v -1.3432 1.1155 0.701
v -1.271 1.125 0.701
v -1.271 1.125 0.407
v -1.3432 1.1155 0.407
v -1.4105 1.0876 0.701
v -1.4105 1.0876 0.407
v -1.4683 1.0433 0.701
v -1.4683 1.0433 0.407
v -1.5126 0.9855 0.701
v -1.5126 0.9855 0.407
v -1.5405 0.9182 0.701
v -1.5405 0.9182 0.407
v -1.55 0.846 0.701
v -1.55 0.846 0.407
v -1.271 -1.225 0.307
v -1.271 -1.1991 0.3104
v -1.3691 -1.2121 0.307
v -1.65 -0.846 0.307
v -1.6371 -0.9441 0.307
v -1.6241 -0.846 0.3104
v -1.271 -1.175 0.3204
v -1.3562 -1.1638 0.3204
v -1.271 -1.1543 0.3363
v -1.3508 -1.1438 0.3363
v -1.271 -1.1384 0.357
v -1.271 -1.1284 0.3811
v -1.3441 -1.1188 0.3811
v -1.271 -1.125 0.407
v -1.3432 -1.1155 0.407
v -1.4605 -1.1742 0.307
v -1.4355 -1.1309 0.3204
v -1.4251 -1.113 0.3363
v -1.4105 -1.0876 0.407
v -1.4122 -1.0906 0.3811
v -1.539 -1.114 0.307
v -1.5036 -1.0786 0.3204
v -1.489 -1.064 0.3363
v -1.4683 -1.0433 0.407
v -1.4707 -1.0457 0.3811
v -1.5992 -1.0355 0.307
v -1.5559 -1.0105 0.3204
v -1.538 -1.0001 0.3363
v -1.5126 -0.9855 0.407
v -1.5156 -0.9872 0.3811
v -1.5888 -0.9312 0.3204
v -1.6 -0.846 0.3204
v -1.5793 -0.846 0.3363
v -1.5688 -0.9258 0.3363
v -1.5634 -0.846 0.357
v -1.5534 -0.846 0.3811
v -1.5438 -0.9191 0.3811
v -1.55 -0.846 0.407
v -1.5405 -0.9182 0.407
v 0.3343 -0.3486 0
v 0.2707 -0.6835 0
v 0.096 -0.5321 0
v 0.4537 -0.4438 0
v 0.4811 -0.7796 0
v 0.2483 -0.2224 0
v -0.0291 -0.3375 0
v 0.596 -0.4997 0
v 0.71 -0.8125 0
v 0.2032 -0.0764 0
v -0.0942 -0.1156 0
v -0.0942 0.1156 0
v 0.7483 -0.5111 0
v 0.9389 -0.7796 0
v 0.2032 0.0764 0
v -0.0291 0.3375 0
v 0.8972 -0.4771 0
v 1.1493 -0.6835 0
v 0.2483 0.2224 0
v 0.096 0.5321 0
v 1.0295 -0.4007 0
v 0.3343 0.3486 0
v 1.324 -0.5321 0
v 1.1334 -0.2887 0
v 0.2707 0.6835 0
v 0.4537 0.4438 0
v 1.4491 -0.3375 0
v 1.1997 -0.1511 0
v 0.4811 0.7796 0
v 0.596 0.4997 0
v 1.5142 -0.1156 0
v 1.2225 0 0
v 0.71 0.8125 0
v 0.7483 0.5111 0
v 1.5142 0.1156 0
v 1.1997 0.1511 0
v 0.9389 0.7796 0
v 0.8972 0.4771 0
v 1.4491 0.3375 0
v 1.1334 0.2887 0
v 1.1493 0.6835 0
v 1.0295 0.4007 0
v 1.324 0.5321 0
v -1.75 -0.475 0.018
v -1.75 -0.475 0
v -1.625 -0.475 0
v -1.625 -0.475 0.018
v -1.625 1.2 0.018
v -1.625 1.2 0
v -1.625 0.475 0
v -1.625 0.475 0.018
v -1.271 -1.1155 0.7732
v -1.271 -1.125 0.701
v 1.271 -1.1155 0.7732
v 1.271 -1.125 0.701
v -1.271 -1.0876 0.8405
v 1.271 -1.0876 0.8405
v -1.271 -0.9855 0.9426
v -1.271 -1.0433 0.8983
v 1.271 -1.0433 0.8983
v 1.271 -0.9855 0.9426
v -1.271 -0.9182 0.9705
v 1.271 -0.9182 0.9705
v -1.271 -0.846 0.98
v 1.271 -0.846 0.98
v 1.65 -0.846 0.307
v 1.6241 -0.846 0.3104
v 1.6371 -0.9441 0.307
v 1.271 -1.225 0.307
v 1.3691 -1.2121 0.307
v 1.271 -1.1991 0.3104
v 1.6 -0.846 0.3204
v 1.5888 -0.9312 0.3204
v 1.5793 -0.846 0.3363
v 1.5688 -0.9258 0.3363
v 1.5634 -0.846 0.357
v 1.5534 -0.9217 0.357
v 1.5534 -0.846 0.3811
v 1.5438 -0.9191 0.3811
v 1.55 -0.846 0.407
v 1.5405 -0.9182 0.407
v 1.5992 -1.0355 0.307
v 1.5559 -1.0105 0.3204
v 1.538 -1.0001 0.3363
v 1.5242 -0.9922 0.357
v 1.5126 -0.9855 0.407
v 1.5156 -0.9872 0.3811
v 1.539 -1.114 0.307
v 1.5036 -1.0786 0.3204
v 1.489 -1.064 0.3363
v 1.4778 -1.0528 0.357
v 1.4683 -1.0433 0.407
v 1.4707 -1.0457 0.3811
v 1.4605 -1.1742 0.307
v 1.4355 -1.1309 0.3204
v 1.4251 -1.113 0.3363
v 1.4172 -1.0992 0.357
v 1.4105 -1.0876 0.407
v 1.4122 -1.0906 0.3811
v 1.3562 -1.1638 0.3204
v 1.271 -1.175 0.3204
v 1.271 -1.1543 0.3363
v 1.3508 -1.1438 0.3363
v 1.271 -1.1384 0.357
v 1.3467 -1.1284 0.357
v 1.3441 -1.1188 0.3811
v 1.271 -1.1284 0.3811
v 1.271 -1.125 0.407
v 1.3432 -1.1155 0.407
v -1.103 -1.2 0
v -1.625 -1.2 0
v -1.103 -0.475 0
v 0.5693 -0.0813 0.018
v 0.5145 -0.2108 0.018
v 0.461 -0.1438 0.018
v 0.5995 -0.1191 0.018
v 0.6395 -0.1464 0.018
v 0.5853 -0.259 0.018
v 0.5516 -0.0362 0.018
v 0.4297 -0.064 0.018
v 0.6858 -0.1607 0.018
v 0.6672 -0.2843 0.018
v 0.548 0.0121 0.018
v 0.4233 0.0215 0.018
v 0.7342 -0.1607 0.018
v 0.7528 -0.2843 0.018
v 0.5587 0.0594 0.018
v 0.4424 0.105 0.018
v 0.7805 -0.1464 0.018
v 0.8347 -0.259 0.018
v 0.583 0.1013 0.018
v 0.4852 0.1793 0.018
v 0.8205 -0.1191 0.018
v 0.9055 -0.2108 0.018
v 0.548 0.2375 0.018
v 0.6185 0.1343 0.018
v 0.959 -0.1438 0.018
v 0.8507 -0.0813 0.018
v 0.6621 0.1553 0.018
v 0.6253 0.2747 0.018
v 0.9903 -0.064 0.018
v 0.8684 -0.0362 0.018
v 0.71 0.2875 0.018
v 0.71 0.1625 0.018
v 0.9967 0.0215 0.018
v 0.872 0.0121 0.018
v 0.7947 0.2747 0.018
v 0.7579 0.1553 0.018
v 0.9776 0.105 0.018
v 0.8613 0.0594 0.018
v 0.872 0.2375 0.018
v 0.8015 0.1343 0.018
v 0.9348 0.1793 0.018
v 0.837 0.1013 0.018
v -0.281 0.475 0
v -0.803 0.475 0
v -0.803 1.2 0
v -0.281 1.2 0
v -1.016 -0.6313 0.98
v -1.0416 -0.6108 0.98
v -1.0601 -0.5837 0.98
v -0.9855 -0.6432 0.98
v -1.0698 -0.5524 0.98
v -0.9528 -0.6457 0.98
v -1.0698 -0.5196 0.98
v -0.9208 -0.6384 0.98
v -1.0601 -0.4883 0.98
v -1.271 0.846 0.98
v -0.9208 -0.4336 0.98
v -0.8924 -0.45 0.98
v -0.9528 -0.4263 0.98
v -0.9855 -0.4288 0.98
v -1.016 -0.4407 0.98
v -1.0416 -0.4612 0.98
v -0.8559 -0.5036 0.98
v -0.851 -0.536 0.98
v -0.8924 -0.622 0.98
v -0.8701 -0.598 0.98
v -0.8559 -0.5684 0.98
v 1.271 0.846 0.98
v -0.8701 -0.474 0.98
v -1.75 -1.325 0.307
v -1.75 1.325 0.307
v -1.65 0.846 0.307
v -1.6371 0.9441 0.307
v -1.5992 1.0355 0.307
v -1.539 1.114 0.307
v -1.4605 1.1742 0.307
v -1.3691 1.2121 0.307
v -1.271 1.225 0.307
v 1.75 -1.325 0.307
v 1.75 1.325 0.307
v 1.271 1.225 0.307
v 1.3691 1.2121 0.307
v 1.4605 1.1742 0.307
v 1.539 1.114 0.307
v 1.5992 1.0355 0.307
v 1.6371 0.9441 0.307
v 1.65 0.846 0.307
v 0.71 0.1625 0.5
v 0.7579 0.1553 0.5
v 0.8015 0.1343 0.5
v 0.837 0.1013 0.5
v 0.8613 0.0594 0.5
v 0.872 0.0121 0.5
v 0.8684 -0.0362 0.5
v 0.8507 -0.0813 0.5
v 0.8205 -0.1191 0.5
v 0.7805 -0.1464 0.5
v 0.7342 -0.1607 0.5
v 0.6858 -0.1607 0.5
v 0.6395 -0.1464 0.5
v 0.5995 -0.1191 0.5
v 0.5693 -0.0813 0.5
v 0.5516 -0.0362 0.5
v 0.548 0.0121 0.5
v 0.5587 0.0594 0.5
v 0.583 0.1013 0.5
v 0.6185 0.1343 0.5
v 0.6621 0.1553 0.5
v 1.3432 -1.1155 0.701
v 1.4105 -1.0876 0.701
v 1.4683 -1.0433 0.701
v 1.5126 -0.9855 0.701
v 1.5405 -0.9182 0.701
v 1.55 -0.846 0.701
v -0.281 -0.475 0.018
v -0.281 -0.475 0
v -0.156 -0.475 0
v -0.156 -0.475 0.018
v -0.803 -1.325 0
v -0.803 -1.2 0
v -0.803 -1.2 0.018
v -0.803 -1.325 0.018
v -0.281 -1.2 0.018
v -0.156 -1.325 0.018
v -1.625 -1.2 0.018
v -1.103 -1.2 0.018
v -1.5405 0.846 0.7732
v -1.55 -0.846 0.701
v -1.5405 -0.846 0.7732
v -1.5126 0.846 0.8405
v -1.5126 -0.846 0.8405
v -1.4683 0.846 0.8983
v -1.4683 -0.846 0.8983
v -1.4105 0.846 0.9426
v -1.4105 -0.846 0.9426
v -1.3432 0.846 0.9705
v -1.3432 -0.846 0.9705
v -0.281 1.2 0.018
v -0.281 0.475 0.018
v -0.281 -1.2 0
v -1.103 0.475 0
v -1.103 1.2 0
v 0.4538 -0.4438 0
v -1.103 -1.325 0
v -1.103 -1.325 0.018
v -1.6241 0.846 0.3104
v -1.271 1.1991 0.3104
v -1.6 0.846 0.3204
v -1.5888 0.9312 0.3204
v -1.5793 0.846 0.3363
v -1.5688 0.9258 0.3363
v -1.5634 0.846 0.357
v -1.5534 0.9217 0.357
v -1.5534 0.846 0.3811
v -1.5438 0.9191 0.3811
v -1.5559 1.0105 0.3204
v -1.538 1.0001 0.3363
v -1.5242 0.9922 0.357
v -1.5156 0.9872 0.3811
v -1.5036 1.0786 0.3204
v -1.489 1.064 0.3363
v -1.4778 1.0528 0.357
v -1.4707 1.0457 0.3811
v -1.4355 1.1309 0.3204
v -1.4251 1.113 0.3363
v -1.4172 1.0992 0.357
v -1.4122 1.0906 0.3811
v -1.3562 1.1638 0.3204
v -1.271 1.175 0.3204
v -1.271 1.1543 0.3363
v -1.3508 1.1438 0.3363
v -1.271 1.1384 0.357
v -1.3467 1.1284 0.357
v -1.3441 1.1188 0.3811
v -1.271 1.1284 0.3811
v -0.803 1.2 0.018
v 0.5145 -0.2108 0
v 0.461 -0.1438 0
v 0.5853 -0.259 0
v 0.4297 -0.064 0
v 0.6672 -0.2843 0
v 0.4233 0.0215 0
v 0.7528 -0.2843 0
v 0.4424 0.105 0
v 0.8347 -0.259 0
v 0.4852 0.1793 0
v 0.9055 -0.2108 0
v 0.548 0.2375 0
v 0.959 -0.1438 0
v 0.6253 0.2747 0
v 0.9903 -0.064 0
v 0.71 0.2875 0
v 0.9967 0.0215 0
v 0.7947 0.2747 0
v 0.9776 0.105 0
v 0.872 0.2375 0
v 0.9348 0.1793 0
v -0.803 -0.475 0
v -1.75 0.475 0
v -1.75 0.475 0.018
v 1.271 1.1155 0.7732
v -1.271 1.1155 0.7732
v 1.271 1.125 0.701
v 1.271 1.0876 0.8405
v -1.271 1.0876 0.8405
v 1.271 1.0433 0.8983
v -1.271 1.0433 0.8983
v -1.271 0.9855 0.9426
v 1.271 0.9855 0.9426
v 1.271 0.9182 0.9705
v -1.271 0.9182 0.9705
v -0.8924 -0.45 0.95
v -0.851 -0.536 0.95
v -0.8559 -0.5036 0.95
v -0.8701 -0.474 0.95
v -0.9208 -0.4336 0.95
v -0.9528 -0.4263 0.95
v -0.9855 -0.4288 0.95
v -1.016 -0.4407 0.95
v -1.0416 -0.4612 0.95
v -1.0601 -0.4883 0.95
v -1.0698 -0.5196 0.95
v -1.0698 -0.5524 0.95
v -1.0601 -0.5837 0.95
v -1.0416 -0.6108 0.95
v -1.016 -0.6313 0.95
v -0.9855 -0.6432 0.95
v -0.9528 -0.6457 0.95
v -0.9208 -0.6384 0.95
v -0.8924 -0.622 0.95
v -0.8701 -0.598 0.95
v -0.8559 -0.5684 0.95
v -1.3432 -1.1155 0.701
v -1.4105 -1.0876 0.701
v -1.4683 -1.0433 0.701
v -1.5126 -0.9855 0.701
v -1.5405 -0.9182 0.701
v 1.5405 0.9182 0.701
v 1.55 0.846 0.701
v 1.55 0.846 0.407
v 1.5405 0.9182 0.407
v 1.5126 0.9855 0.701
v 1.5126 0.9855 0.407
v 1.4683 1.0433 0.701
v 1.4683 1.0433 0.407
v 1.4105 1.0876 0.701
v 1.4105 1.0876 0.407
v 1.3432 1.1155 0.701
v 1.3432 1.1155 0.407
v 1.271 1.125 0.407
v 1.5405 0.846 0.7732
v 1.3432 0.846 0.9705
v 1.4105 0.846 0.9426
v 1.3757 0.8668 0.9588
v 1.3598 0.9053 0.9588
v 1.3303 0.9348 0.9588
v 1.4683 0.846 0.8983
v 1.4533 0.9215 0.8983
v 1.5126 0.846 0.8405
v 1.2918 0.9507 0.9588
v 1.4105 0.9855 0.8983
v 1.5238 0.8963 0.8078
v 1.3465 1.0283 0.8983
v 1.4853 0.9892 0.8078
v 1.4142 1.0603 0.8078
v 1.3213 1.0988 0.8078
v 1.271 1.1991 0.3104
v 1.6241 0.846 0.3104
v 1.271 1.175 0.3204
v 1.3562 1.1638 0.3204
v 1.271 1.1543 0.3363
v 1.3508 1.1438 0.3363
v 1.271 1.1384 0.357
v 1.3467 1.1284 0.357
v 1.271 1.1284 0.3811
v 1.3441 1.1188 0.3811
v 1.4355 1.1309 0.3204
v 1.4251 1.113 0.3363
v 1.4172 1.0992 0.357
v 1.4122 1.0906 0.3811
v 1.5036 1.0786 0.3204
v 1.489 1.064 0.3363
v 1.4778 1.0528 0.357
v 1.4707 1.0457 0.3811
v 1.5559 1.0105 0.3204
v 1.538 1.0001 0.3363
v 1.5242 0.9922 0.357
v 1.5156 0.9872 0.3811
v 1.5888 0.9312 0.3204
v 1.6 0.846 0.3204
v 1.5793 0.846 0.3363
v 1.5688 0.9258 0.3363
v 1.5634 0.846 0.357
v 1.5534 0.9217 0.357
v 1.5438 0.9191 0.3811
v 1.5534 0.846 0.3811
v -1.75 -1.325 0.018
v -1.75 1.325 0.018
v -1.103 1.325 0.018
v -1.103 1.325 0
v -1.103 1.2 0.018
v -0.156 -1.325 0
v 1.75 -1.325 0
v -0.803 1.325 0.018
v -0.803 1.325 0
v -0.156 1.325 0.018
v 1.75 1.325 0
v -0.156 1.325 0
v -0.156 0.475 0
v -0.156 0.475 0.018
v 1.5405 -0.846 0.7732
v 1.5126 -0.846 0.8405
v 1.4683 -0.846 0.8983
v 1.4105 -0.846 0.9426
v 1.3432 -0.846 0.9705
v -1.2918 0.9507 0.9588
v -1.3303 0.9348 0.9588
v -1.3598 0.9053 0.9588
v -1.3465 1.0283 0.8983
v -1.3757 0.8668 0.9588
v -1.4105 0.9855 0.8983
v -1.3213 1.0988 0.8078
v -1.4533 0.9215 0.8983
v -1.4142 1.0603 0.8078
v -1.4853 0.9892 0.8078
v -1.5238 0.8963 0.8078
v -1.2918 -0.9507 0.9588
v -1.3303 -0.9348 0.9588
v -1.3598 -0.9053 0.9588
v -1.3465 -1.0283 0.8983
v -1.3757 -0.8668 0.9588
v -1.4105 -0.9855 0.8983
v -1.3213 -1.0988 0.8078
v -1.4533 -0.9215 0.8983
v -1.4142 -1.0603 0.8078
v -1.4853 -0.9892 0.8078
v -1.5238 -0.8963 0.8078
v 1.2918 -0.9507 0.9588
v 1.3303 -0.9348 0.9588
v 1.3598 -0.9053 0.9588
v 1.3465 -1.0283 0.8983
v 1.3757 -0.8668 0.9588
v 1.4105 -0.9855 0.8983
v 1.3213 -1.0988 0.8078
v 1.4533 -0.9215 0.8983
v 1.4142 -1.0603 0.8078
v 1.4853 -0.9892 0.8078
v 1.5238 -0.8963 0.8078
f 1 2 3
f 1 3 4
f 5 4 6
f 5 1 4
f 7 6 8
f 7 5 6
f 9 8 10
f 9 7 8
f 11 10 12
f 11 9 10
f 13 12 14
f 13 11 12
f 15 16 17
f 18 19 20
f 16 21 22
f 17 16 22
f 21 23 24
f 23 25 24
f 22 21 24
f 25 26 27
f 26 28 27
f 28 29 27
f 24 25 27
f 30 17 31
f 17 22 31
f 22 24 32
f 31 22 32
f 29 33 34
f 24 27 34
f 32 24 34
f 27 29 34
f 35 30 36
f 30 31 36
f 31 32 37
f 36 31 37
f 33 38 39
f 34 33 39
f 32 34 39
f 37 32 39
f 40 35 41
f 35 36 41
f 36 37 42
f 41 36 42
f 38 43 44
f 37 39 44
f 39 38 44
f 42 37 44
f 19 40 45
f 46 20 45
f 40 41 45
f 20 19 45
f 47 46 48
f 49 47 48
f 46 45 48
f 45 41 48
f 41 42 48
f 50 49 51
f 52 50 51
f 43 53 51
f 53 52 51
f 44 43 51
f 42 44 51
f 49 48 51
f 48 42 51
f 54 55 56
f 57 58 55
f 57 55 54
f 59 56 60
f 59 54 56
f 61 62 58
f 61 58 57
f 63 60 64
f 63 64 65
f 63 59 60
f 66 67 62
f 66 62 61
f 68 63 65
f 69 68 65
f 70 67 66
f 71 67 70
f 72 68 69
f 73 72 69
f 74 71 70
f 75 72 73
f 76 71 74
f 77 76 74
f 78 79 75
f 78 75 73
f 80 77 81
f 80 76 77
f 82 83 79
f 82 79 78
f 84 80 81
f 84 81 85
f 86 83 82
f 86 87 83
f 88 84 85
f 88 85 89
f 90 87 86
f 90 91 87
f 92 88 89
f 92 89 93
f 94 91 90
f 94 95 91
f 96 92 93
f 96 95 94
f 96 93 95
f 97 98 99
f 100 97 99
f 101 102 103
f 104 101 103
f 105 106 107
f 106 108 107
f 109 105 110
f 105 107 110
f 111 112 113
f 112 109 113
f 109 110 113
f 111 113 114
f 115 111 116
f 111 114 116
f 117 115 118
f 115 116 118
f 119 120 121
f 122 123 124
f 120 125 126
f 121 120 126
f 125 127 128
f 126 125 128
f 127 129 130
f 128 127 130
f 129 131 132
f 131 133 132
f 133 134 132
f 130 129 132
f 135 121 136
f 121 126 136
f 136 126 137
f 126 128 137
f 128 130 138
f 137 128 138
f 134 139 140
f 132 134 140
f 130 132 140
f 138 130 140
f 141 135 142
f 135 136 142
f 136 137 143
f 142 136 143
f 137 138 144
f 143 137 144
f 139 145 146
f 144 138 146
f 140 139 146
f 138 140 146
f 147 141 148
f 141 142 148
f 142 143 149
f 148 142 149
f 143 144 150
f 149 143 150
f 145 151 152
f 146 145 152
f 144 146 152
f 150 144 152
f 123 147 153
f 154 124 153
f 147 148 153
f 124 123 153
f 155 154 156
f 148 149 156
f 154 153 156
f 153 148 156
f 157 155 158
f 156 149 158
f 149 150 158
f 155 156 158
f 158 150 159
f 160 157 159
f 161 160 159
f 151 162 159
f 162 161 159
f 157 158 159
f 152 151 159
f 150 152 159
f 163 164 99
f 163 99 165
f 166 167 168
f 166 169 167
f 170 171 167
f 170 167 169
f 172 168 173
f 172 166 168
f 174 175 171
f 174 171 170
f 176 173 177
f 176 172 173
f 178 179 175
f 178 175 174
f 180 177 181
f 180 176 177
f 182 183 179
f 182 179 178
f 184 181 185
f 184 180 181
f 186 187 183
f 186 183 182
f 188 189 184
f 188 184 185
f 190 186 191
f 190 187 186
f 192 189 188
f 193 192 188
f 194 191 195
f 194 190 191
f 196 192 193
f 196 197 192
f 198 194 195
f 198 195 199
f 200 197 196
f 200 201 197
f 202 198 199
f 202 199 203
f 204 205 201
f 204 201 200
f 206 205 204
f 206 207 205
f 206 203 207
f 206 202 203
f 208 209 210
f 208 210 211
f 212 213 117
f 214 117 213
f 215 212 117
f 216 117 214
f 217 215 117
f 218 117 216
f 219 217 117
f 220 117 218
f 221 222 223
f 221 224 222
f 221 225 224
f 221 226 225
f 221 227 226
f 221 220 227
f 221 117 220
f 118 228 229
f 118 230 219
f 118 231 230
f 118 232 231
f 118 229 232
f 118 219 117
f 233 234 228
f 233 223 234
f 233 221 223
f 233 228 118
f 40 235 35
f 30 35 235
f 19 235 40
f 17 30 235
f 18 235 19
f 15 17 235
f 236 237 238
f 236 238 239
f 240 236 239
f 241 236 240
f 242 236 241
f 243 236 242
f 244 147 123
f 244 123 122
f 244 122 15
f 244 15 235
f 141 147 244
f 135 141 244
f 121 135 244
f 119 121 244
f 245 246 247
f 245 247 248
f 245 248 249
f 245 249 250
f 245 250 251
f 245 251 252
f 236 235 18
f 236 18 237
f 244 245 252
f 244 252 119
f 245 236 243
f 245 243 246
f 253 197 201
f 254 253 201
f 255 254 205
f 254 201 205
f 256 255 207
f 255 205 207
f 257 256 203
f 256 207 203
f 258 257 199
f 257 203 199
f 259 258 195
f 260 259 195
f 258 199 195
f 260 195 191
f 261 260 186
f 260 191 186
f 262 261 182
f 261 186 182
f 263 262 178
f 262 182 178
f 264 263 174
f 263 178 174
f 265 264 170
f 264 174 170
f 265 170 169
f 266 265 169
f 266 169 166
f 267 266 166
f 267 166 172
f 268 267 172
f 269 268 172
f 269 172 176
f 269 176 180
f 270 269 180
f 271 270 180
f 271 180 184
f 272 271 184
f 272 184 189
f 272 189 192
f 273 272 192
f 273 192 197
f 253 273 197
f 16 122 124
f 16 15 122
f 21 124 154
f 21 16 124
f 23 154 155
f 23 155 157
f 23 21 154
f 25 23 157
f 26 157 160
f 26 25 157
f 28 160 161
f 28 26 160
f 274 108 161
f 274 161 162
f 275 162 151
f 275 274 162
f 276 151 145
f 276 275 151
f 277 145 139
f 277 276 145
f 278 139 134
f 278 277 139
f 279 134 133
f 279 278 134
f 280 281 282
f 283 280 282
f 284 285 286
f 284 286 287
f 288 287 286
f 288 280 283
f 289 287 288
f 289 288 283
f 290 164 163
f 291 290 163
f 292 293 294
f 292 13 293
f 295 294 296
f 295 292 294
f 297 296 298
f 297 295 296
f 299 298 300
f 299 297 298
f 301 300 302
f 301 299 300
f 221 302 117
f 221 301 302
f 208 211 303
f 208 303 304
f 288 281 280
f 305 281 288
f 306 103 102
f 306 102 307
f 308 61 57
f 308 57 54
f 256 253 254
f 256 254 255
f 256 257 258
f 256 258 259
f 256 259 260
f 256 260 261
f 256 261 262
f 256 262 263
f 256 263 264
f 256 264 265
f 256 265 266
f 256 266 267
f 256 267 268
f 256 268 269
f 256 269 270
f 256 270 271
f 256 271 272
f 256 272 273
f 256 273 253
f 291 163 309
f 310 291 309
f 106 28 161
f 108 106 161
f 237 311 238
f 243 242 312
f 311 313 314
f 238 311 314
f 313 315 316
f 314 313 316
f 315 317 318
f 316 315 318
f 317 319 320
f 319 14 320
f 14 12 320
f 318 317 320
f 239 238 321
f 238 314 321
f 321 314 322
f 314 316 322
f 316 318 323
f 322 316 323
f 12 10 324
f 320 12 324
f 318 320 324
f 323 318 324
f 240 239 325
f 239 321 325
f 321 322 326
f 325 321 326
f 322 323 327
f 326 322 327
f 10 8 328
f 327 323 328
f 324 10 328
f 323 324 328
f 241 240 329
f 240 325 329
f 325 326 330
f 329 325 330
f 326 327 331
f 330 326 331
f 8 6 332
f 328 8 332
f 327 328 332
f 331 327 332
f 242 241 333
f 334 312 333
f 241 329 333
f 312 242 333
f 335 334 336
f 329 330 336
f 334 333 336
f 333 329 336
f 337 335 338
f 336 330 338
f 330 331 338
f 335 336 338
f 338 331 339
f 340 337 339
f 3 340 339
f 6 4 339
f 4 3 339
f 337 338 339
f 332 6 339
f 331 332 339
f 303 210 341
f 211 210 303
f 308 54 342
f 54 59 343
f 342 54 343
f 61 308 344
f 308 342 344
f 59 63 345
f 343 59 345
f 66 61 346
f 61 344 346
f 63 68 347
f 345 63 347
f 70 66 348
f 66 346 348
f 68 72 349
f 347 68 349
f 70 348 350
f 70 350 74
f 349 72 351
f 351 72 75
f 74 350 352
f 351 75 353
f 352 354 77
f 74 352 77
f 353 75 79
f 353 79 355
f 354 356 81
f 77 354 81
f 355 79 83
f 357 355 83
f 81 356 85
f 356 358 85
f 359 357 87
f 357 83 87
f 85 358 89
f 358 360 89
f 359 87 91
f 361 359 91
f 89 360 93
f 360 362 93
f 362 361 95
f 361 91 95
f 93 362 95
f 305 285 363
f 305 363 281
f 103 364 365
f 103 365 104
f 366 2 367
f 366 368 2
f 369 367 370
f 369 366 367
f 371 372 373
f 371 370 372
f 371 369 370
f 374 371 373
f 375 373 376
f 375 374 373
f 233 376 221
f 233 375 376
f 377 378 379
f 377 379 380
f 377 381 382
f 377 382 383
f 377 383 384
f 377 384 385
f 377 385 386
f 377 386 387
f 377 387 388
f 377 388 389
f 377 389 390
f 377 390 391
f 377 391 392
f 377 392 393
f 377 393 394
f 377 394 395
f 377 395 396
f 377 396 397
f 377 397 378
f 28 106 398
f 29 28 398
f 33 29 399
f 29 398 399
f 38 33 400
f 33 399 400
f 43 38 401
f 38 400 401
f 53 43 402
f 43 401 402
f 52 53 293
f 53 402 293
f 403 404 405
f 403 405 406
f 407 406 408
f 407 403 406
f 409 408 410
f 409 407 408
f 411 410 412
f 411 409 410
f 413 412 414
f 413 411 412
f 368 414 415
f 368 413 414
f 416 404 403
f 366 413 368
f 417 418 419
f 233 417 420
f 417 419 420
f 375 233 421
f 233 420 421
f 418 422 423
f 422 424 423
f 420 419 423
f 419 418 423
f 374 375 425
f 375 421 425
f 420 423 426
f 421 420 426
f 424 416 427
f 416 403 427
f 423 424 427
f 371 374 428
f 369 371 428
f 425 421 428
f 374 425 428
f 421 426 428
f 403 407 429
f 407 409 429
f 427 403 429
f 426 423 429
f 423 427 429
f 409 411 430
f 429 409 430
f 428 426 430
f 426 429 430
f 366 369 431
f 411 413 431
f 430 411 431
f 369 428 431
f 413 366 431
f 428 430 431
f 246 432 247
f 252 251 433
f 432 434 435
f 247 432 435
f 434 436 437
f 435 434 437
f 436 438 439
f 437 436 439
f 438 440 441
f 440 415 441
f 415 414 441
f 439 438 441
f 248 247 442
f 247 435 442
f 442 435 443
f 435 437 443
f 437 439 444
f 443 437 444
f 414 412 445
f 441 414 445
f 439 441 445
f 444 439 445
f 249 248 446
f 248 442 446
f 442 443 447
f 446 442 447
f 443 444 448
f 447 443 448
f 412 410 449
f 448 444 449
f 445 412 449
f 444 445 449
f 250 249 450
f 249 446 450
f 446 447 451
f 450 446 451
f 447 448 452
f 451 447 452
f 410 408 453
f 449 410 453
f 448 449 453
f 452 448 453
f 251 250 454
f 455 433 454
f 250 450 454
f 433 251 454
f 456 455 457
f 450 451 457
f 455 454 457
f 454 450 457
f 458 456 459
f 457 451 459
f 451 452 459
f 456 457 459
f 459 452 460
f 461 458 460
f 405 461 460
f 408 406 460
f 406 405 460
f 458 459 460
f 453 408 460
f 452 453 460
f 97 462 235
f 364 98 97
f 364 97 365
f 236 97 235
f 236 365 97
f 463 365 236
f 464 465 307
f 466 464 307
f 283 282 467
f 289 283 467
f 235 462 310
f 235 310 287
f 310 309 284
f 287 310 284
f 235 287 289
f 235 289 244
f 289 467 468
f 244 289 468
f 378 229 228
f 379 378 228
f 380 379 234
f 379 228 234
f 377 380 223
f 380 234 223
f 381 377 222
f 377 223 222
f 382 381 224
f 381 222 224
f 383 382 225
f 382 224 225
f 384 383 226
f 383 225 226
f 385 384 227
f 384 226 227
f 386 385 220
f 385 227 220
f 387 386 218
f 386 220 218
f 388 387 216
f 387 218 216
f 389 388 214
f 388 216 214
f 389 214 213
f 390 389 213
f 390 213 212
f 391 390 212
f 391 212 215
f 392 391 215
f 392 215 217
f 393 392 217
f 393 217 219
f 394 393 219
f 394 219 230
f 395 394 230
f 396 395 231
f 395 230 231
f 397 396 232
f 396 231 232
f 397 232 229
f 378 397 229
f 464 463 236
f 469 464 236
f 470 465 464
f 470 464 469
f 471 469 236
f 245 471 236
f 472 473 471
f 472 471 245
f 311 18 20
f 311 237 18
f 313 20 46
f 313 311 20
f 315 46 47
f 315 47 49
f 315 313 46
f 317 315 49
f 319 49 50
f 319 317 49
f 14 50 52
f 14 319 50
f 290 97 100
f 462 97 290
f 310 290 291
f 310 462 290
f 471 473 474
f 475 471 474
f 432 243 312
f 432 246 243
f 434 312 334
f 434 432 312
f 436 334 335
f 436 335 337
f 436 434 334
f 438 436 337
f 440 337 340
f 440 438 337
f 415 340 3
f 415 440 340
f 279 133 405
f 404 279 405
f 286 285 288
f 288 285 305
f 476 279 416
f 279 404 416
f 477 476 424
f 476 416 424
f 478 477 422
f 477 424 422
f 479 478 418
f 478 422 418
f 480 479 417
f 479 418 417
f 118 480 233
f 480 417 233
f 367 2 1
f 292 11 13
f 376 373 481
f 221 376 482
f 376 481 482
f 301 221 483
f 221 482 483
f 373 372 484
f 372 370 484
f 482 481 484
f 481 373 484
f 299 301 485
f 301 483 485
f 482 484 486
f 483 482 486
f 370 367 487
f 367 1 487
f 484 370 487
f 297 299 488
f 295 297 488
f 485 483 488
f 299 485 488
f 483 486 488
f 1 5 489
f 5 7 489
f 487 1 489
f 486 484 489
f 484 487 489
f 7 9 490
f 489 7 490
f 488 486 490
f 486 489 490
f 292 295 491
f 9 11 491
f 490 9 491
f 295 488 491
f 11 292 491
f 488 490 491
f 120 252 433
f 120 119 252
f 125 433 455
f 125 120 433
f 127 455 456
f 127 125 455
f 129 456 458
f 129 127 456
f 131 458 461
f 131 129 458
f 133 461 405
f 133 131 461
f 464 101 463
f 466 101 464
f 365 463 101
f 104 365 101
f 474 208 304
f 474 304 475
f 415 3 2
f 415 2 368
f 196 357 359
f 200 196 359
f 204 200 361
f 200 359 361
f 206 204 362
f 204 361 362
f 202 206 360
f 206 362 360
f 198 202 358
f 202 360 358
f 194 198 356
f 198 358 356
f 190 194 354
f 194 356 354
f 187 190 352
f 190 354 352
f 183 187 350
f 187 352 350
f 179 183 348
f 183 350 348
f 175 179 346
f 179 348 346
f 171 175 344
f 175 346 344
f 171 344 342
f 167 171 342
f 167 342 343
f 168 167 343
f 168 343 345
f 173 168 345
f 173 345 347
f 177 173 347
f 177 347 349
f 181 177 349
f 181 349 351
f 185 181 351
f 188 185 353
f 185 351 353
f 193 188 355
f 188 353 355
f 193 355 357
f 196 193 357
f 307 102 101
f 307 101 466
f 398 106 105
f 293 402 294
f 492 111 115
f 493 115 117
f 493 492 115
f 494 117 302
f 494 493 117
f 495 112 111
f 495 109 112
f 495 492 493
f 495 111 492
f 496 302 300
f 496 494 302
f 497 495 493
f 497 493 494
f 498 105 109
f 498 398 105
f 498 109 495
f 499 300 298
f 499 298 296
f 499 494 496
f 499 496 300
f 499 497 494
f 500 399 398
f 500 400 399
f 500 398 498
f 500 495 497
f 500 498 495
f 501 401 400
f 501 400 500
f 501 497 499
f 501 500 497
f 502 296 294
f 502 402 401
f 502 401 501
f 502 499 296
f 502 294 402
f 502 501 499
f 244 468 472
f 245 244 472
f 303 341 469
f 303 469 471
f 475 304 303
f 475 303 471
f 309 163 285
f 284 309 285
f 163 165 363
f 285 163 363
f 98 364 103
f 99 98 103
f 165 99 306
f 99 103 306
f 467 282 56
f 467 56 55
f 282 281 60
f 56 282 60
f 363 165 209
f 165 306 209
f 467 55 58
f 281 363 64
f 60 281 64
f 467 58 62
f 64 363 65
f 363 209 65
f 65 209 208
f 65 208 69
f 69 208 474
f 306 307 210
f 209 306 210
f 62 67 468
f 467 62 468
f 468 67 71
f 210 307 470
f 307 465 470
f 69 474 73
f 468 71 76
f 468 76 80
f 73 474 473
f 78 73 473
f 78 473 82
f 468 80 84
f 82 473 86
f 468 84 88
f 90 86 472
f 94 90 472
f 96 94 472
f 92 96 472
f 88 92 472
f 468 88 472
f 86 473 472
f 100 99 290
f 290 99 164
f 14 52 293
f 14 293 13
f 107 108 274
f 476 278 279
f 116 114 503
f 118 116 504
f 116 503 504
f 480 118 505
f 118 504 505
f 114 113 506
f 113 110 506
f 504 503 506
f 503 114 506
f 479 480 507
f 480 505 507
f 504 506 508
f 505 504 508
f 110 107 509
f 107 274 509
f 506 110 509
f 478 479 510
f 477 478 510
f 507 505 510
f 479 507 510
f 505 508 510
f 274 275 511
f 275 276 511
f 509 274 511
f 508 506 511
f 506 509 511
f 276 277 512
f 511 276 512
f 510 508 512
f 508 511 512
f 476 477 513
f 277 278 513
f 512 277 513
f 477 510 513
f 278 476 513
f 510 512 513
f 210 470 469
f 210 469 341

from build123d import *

# Parameters (mm, degrees)
SKETCH1_W           = 3.5
SKETCH1_H           = 2.65
BOSS_EXTRUDE1_DEPTH = 0.307
SKETCH2_W           = 3.1
SKETCH2_H           = 2.25
BOSS_EXTRUDE2_DEPTH = 0.673
FILLET1_R           = 0.279
SKETCH3_R           = 0.11
CUT_EXTRUDE1_DEPTH  = 0.03
FILLET2_R           = 0.1
SKETCH4_R           = 0.1625
CUT_EXTRUDE2_DEPTH  = 0.5
SKETCH5_W           = 0.647
SKETCH5_H           = 0.85
SKETCH5_R           = 0.8125
SKETCH5_R_2         = 0.5125
SKETCH5_R_3         = 0.2875
SKETCH5_R_4         = 0.1625
CUT_EXTRUDE3_DEPTH  = 0.018
BOSS_EXTRUDE3_START = 0.01801
SKETCH6_R           = 0.8125
SKETCH6_R_2         = 0.5125
SKETCH6_W           = 0.522
SKETCH6_H           = 0.725
BOSS_EXTRUDE3_DEPTH = 0.01801


with BuildPart() as part:
    # Sketch1 → Boss-Extrude1 (new body)
    with BuildSketch(Plane.XY):
        Rectangle(SKETCH1_W, SKETCH1_H)
    extrude(amount=BOSS_EXTRUDE1_DEPTH)

    # Sketch2 → Boss-Extrude2 (add)
    with BuildSketch(Plane.XY.offset(0.307)):
        Rectangle(SKETCH2_W, SKETCH2_H)
    extrude(amount=BOSS_EXTRUDE2_DEPTH)

    # Fillet1
    fillet1_edges = [part.edges().sort_by_distance(p)[0] for p in [
        (1.55, -1.125, 0.6435),
        (1.55, 1.125, 0.6435),
        (-1.55, 1.125, 0.6435),
        (-1.55, -1.125, 0.6435),
        (0, -1.125, 0.98),
        (1.55, 0, 0.98),
        (0, 1.125, 0.98),
        (-1.55, 0, 0.98),
    ]]
    fillet(fillet1_edges, radius=FILLET1_R)

    # Sketch3 → Cut-Extrude1 (cut)
    with BuildSketch(Plane.XY.offset(0.98)):
        with Locations((-0.961, -0.536)):
            Circle(SKETCH3_R)
    extrude(amount=-CUT_EXTRUDE1_DEPTH, mode=Mode.SUBTRACT)

    # Fillet2
    fillet2_edges = [part.edges().sort_by_distance(p)[0] for p in [
        (-1.55, 0, 0.307),
        (0, 1.125, 0.307),
        (1.55, 0, 0.307),
        (0, -1.125, 0.307),
        (-1.468282792, 1.043282792, 0.307),
        (1.468282792, 1.043282792, 0.307),
        (1.468282792, -1.043282792, 0.307),
        (-1.468282792, -1.043282792, 0.307),
    ]]
    fillet(fillet2_edges, radius=FILLET2_R)

    # Sketch4 → Cut-Extrude2 (cut)
    with BuildSketch(Plane(origin=(0, 0, 0), x_dir=(1, 0, 0), z_dir=(0, 0, -1))):
        with Locations(Location((0.71, 0, 0), (0, 0, 270))):
            Circle(SKETCH4_R)
    extrude(amount=-CUT_EXTRUDE2_DEPTH, mode=Mode.SUBTRACT)

    # Sketch5 → Cut-Extrude3 (cut)
    # profile 1 of 6: a face of its own
    with BuildSketch(Plane(origin=(0, 0, 0), x_dir=(1, 0, 0), z_dir=(0, 0, -1))):
        with Locations((-0.4795, 0.9)):
            Rectangle(SKETCH5_W, SKETCH5_H)
    # profile 2 of 6: a face of its own
    with BuildSketch(Plane(origin=(0, 0, 0), x_dir=(1, 0, 0), z_dir=(0, 0, -1))):
        with Locations((-1.4265, 0.9)):
            Rectangle(SKETCH5_W, SKETCH5_H)
    # profile 3 of 6: a face of its own
    with BuildSketch(Plane(origin=(0, 0, 0), x_dir=(1, 0, 0), z_dir=(0, 0, -1))):
        with Locations((-1.4265, -0.9)):
            Rectangle(SKETCH5_W, SKETCH5_H)
    # profile 4 of 6: a face of its own
    with BuildSketch(Plane(origin=(0, 0, 0), x_dir=(1, 0, 0), z_dir=(0, 0, -1))):
        with Locations((-0.4795, -0.9)):
            Rectangle(SKETCH5_W, SKETCH5_H)
    # profile 5 of 6: a face of its own
    with BuildSketch(Plane(origin=(0, 0, 0), x_dir=(1, 0, 0), z_dir=(0, 0, -1))):
        with Locations(Location((0.71, 0, 0), (0, 0, 270))):
            Circle(SKETCH5_R)
        with Locations(Location((0.71, 0, 0), (0, 0, 270))):
            Circle(SKETCH5_R_2, mode=Mode.SUBTRACT)
    # profile 6 of 6: a face of its own
    with BuildSketch(Plane(origin=(0, 0, 0), x_dir=(1, 0, 0), z_dir=(0, 0, -1))):
        with Locations(Location((0.71, 0, 0), (0, 0, 270))):
            Circle(SKETCH5_R_3)
        with Locations(Location((0.71, 0, 0), (0, 0, 270))):
            Circle(SKETCH5_R_4, mode=Mode.SUBTRACT)
    extrude(amount=-CUT_EXTRUDE3_DEPTH, mode=Mode.SUBTRACT)

    # Sketch6 → Boss-Extrude3 (add)
    # profile 1 of 5: a face of its own
    with BuildSketch(Plane(origin=(0, 0, 0.018), x_dir=(1, 0, 0), z_dir=(0, 0, -1)).offset(BOSS_EXTRUDE3_START)):
        with Locations(Location((0.71, 0, 0), (0, 0, 270))):
            Circle(SKETCH6_R)
        with Locations((0.71, 0)):
            Circle(SKETCH6_R_2, mode=Mode.SUBTRACT)
    # profile 2 of 5: a face of its own
    with BuildSketch(Plane(origin=(0, 0, 0.018), x_dir=(1, 0, 0), z_dir=(0, 0, -1)).offset(BOSS_EXTRUDE3_START)):
        with Locations((-1.364, 0.8375)):
            Rectangle(SKETCH6_W, SKETCH6_H)
    # profile 3 of 5: a face of its own
    with BuildSketch(Plane(origin=(0, 0, 0.018), x_dir=(1, 0, 0), z_dir=(0, 0, -1)).offset(BOSS_EXTRUDE3_START)):
        with Locations((-0.542, 0.8375)):
            Rectangle(SKETCH6_W, SKETCH6_H)
    # profile 4 of 5: a face of its own
    with BuildSketch(Plane(origin=(0, 0, 0.018), x_dir=(1, 0, 0), z_dir=(0, 0, -1)).offset(BOSS_EXTRUDE3_START)):
        with Locations((-0.542, -0.8375)):
            Rectangle(SKETCH6_W, SKETCH6_H)
    # profile 5 of 5: a face of its own
    with BuildSketch(Plane(origin=(0, 0, 0.018), x_dir=(1, 0, 0), z_dir=(0, 0, -1)).offset(BOSS_EXTRUDE3_START)):
        with Locations((-1.364, -0.8375)):
            Rectangle(SKETCH6_W, SKETCH6_H)
    extrude(amount=-BOSS_EXTRUDE3_DEPTH)


solid = part.part
